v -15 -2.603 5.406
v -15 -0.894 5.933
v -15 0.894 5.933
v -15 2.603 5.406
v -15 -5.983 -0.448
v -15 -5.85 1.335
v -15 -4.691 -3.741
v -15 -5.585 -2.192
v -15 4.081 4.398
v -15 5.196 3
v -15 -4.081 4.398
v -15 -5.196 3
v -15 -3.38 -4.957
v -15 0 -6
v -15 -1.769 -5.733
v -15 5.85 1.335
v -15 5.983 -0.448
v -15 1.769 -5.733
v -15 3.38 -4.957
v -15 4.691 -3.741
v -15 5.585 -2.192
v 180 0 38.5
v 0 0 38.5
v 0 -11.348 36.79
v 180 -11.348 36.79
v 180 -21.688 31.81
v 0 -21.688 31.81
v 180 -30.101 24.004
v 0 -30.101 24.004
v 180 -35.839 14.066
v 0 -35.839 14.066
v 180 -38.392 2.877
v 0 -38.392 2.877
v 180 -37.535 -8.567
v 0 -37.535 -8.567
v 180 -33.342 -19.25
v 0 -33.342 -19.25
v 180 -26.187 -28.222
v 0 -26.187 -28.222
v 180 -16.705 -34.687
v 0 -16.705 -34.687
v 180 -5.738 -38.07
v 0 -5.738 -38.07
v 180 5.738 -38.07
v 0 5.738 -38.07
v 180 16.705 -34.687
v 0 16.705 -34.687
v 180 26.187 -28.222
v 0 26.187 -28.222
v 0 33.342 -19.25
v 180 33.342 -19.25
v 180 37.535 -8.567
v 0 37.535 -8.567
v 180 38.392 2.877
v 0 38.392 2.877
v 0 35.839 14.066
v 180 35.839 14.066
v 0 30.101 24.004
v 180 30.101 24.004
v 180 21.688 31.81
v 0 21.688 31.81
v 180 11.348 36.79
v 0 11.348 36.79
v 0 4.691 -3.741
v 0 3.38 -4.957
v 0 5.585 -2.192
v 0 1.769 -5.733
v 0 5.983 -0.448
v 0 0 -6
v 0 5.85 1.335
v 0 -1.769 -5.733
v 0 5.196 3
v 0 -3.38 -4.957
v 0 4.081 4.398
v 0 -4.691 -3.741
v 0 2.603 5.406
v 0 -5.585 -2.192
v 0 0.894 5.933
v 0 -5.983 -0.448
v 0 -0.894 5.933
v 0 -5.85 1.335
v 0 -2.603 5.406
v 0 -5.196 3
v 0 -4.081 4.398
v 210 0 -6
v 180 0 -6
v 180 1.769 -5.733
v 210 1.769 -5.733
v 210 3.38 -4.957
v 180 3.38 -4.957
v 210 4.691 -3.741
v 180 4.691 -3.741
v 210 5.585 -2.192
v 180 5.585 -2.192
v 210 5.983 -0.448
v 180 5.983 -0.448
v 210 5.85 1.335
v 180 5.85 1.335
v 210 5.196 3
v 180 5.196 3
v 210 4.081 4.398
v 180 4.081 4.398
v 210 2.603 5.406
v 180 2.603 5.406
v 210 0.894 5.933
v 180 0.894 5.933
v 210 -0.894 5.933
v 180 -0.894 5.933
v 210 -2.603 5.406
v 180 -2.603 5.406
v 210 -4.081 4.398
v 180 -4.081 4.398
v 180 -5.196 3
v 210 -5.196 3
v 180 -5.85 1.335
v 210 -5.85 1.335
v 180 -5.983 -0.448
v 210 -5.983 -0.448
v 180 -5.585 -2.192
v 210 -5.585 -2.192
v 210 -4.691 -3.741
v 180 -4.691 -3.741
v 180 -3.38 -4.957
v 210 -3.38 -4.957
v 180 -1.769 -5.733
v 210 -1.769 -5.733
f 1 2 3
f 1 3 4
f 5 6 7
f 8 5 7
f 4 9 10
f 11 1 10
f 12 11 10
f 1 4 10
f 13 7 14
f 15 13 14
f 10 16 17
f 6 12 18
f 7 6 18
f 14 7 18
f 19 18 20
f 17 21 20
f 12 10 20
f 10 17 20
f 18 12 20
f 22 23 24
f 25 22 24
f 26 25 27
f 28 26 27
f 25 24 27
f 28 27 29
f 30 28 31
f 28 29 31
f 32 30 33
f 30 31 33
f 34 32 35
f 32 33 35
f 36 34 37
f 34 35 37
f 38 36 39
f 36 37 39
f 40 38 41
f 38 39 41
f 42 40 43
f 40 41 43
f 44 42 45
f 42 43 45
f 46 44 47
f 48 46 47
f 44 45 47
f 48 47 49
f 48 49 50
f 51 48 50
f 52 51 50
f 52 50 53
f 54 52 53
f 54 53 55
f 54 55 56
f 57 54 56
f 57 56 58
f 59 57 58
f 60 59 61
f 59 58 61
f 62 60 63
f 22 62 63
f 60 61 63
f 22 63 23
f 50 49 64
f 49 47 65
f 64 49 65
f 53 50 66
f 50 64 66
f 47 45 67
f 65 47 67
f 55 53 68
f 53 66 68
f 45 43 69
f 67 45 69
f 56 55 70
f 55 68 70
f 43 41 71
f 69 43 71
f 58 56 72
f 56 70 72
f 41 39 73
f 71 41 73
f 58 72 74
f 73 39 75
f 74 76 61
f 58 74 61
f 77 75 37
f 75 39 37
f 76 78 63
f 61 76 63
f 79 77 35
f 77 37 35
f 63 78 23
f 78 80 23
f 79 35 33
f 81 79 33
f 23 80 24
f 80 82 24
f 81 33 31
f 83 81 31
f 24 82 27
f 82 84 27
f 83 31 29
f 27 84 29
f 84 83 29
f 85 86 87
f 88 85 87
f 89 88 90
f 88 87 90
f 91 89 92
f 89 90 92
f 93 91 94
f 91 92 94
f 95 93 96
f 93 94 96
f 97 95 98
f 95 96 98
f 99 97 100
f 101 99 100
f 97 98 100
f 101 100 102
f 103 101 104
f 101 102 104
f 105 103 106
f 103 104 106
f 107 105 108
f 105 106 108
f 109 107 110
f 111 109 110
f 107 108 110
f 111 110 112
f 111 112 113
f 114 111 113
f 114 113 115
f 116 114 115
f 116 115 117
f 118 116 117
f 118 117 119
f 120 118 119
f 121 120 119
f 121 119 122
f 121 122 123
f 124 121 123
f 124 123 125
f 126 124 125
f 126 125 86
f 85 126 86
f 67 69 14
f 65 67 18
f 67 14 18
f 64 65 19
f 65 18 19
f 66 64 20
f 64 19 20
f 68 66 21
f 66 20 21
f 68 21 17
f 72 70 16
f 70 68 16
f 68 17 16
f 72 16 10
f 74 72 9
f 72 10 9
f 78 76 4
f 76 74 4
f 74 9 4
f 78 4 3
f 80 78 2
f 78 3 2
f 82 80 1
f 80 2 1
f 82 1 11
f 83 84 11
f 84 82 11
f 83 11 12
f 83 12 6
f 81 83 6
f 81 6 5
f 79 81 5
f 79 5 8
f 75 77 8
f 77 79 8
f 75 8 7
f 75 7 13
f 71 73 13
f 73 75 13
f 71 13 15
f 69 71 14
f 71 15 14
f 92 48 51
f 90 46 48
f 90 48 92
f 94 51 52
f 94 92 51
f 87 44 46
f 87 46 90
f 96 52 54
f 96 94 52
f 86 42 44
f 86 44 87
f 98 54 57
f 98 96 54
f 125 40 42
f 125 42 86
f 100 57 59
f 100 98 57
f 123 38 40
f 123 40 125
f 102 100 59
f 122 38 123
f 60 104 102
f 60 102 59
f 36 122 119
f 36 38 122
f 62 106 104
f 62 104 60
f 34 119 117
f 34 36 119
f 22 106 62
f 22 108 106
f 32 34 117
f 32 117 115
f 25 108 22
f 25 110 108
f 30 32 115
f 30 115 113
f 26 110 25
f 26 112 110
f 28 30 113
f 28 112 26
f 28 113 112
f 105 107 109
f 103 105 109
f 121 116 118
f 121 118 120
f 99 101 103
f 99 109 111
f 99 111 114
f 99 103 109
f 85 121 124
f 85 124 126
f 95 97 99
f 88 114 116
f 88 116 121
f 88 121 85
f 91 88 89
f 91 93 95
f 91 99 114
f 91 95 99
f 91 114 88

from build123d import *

# Parameters (mm, degrees)
SKETCH1_R                = 38.5
SKETCH1_R_2              = 6
BOSS_EXTRUDE1_DEPTH      = 180
BOSS_EXTRUDE2_DEPTH      = 210
BOSS_EXTRUDE2_DEPTH_BACK = 15
SKETCH1_3_R              = 6


with BuildPart() as part:
    # Sketch1 → Boss-Extrude1 (new body)
    with BuildSketch(Plane(origin=(0, 0, 0), x_dir=(0, 0, -1), z_dir=(1, 0, 0))):
        Circle(SKETCH1_R)
        Circle(SKETCH1_R_2, mode=Mode.SUBTRACT)
    extrude(amount=BOSS_EXTRUDE1_DEPTH)

    # Sketch1<3> → Boss-Extrude2 (add, two sides: drawn at the far end of the back side and taken through both)
    with BuildSketch(Plane(origin=(0, 0, 0), x_dir=(0, 0, -1), z_dir=(1, 0, 0)).offset(-BOSS_EXTRUDE2_DEPTH_BACK)):
        Circle(SKETCH1_3_R)
    extrude(amount=BOSS_EXTRUDE2_DEPTH + BOSS_EXTRUDE2_DEPTH_BACK)


solid = part.part
